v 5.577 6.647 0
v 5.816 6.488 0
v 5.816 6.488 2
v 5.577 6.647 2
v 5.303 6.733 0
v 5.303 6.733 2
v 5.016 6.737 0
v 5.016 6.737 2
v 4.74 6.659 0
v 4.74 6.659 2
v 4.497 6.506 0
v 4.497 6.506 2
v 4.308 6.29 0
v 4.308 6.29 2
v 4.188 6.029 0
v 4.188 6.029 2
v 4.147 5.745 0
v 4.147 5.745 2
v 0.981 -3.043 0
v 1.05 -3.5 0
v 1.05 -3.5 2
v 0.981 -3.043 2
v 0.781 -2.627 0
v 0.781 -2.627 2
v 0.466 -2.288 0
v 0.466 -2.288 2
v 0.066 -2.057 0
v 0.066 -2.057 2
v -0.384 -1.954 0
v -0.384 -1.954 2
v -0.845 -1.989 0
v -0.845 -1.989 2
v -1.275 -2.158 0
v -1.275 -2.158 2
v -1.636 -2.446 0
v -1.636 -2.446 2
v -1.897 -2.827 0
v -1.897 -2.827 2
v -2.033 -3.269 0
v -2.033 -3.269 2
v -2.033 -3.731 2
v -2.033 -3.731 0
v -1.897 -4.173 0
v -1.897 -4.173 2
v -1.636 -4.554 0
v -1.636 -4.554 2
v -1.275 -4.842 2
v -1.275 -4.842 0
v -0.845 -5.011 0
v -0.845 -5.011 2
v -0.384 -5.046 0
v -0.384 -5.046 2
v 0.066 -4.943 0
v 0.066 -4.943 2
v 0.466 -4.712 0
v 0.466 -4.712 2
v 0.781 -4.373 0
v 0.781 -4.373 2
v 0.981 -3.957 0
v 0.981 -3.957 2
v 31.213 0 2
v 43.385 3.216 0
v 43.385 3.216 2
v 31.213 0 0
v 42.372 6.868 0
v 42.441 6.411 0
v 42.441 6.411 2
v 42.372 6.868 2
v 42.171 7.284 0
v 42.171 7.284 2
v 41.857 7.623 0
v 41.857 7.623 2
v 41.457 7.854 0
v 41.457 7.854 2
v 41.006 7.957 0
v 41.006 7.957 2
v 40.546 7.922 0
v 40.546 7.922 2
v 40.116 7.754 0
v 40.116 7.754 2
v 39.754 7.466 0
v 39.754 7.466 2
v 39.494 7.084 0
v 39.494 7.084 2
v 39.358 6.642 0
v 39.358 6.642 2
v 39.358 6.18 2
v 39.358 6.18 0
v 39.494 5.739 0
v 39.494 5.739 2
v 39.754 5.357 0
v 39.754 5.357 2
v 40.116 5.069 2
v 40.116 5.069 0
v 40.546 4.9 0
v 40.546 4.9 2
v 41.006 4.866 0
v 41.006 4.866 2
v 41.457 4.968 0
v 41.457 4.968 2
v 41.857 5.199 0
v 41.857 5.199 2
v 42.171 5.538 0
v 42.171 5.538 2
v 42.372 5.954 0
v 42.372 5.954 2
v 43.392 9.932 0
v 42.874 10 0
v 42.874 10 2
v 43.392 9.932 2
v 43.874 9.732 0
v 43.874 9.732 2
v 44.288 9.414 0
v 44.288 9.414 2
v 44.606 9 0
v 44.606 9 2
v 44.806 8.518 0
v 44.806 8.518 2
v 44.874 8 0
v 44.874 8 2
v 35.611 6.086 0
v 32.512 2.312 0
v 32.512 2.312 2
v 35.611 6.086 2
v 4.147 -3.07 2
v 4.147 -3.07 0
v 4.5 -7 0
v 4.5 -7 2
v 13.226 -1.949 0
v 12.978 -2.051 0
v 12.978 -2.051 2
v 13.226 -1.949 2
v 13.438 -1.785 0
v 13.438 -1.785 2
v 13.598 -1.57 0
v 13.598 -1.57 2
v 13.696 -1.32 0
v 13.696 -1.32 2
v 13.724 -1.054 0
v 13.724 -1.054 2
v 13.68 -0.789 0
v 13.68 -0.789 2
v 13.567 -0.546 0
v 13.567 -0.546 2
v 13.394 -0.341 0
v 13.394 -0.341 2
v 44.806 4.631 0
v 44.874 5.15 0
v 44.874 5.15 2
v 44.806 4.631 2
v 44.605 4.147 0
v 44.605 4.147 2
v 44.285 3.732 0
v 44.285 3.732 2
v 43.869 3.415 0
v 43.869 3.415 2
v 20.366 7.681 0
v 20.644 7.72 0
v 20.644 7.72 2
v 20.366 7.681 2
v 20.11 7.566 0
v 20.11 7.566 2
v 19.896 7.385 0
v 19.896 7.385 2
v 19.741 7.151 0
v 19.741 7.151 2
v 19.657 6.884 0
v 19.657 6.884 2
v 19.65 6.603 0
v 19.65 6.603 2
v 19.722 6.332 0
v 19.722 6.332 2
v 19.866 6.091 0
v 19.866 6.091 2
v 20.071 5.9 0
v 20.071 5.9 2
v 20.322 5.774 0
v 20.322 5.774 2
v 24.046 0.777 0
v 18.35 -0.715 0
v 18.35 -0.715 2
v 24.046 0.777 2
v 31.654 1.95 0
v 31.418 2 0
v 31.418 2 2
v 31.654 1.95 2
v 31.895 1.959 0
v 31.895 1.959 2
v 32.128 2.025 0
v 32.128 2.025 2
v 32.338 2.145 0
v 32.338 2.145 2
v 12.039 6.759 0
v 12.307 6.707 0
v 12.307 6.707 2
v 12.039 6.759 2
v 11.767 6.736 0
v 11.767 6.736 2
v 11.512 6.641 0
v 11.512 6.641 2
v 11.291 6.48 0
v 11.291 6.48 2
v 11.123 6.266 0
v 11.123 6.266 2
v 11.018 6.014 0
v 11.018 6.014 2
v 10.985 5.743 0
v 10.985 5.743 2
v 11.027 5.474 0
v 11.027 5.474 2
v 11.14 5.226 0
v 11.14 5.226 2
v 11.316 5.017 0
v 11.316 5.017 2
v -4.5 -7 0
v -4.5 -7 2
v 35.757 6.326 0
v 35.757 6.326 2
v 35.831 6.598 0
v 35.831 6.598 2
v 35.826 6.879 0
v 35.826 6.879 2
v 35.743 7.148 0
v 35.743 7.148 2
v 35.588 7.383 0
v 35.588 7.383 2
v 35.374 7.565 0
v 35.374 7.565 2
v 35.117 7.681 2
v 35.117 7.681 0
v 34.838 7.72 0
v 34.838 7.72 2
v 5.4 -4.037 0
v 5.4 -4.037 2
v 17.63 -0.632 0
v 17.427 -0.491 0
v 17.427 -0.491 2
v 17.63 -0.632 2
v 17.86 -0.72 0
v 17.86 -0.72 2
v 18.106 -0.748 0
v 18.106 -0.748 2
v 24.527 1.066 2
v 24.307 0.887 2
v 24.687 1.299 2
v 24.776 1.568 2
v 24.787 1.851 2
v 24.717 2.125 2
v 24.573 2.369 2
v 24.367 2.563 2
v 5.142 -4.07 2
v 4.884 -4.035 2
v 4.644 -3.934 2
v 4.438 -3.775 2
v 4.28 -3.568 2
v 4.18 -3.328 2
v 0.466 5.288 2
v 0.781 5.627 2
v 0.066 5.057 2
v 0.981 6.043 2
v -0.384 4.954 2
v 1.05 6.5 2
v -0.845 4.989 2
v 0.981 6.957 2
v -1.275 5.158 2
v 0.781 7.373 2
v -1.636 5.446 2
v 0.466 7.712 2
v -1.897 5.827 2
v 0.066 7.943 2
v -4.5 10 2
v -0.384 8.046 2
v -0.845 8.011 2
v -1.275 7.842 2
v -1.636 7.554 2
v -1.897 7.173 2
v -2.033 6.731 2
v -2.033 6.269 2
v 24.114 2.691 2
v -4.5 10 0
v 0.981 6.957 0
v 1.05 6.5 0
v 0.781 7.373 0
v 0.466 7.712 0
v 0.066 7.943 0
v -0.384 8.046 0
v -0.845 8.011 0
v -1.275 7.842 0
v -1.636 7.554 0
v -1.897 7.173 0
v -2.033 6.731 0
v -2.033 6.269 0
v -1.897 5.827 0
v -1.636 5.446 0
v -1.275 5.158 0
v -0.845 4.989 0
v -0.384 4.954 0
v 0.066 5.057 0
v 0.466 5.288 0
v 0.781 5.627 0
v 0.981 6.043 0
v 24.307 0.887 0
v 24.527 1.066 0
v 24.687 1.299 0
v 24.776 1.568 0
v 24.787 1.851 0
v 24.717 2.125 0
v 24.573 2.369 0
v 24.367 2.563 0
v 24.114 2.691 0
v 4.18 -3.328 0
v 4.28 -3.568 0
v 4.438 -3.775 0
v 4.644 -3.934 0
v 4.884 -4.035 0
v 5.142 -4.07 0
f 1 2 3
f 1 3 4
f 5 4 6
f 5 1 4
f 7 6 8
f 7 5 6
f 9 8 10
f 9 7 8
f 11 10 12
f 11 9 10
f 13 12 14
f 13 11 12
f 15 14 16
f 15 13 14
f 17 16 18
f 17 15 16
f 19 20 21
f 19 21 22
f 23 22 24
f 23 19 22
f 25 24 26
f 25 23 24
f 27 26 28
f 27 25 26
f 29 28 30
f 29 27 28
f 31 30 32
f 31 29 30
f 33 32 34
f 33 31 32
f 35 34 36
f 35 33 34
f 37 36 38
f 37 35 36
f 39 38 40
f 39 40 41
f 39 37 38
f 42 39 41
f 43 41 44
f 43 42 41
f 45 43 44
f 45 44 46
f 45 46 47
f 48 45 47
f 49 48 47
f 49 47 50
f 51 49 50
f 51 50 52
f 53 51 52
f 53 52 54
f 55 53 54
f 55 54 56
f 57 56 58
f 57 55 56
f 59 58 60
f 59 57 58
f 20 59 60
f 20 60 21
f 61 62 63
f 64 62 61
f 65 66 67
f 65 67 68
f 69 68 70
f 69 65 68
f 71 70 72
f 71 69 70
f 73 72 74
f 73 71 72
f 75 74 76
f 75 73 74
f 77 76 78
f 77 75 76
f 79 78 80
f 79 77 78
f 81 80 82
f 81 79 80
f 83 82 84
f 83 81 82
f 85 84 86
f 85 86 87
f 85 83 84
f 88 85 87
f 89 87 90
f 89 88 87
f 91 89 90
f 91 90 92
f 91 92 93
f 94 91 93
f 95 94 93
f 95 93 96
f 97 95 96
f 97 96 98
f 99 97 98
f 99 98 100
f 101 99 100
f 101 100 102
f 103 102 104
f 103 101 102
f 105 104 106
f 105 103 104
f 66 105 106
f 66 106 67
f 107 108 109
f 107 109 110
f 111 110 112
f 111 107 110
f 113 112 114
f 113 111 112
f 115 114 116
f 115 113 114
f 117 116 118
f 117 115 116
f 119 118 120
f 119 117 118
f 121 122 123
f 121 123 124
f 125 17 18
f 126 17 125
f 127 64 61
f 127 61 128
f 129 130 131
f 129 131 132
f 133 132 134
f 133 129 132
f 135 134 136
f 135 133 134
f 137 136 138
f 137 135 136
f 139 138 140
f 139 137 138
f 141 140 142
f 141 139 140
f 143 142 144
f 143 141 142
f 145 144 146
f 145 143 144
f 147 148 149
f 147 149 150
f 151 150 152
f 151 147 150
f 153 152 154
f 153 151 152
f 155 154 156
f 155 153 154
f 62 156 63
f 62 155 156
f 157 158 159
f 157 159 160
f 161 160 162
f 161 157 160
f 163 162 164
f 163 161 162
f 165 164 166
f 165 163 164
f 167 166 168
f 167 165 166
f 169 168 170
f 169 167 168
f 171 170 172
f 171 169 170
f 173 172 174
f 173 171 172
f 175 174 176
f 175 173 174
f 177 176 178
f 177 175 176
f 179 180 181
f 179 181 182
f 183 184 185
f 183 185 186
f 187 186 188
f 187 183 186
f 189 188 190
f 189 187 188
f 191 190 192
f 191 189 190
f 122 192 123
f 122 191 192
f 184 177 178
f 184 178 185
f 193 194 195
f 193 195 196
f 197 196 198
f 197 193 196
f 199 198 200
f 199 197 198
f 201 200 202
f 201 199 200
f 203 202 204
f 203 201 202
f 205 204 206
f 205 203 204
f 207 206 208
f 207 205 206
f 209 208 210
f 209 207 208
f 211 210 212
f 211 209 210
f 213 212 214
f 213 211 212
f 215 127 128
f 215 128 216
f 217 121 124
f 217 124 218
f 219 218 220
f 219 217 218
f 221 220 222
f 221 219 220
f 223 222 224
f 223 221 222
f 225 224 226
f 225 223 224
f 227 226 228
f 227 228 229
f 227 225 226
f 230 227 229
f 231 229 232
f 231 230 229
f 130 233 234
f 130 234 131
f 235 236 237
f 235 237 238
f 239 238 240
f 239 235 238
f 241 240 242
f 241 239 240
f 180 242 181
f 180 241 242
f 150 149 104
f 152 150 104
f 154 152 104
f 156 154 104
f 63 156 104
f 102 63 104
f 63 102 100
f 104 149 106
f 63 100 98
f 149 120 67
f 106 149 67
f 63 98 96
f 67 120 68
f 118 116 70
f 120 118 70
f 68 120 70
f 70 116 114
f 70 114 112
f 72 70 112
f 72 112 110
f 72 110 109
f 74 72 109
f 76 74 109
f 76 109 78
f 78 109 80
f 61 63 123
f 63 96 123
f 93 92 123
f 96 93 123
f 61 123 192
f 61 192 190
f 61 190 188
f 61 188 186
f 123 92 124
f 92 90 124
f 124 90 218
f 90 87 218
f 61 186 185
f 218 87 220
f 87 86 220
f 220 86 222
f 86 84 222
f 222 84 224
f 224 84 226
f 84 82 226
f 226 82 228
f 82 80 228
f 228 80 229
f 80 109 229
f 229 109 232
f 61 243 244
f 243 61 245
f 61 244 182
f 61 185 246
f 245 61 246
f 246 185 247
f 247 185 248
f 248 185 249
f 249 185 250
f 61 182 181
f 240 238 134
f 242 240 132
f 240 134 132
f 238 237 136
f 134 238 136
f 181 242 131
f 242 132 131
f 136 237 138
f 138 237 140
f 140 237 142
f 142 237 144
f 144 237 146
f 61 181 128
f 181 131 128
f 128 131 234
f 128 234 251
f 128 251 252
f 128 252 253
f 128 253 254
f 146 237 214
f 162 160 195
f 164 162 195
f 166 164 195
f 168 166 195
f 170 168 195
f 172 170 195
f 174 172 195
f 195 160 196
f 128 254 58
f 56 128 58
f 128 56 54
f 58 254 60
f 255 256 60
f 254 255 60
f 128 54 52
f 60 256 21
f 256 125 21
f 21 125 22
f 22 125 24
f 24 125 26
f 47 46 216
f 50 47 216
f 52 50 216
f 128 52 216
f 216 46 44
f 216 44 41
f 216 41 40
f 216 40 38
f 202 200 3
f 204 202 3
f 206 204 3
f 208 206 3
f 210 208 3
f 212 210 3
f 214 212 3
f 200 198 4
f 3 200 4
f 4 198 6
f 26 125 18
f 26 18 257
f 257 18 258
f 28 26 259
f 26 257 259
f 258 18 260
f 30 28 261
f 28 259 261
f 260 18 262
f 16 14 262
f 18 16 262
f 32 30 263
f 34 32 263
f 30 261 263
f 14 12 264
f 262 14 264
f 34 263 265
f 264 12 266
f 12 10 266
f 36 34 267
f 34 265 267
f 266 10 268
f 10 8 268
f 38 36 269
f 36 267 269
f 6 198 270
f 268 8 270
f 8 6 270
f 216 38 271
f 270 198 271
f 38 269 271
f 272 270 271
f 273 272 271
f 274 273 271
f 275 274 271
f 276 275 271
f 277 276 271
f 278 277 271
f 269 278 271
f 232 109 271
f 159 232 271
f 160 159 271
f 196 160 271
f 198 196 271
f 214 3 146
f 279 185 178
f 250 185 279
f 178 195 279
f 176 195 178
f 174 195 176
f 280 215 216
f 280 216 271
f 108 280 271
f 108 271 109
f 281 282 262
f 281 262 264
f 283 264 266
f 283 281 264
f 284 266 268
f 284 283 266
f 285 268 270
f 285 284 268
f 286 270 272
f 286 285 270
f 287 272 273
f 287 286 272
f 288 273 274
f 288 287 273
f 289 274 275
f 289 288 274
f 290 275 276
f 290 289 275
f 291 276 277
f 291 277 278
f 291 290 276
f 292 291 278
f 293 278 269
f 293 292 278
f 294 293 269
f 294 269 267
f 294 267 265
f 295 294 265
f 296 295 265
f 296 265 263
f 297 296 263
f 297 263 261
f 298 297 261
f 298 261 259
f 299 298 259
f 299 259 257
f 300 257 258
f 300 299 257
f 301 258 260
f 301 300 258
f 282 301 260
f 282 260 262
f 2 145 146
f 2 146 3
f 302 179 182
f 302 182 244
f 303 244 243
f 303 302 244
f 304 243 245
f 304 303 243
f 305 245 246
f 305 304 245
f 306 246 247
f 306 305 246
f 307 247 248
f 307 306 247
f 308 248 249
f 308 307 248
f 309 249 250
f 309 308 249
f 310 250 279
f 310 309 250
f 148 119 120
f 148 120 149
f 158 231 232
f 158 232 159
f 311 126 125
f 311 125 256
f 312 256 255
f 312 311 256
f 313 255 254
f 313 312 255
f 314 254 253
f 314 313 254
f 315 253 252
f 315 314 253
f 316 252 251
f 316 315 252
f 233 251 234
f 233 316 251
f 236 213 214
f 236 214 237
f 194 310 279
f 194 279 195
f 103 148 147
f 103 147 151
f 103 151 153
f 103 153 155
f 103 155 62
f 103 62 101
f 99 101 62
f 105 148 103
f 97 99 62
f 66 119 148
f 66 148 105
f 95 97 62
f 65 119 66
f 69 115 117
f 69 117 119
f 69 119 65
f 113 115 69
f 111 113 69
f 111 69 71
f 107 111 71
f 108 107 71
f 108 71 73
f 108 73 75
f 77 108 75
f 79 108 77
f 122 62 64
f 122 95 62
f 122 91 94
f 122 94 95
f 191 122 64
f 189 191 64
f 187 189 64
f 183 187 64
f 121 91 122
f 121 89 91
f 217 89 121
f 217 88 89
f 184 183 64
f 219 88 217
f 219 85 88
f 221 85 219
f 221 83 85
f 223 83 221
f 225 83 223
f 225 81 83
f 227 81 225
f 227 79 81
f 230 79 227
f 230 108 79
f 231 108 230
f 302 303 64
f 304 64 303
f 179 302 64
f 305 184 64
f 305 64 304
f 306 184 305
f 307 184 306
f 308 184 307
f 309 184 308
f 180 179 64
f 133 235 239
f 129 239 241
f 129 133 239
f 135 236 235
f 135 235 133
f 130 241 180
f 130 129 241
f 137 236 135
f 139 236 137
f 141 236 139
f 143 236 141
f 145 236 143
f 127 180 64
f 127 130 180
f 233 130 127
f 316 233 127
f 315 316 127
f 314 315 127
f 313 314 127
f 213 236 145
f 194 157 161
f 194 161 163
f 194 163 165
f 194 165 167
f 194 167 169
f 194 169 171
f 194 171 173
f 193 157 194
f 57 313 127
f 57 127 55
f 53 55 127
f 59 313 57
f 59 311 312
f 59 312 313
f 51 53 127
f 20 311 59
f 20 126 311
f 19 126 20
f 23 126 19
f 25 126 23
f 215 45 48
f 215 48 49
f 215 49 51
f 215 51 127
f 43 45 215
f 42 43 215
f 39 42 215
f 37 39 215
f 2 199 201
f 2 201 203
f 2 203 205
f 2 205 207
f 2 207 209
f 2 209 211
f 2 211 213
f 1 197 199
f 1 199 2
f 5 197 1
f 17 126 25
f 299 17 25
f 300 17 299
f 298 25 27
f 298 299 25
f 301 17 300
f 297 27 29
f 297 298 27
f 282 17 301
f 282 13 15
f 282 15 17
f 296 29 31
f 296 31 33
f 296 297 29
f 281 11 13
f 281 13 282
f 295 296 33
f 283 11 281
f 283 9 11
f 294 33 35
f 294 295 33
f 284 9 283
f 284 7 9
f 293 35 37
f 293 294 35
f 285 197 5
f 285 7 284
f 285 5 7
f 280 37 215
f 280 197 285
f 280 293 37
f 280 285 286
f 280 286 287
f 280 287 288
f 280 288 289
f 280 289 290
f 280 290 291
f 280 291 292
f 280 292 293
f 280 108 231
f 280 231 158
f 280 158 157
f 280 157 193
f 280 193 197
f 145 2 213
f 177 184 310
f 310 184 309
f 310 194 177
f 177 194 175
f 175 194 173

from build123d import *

# Parameters (mm, degrees)
SKETCH_1_R      = 1.55
EXTRUDE_1_DEPTH = 2


with BuildPart() as part:
    # 草图1 → 凸台-拉伸1 (new body)
    with BuildSketch(Plane.XY):
        with BuildLine():
            Line((-4.5, 10), (4.5, 10))
            Line((4.5, 10), (42.874156462, 10))
            ThreePointArc((42.874156462, 10), (44.288370024, 9.414213562), (44.874156462, 8))
            Line((44.874156462, 8), (44.874156462, 5.149651674))
            ThreePointArc((44.874156462, 5.149651674), (44.458733517, 3.929358448), (43.385040906, 3.216003028))
            Line((43.385040906, 3.216003028), (31.212777732, 0))
            Line((31.212777732, 0), (4.5, -7))
            Line((4.5, -7), (-4.5, -7))
            Line((-4.5, -7), (-4.5, 10))
        make_face()
        with Locations((-0.5, 6.5)):
            Circle(SKETCH_1_R, mode=Mode.SUBTRACT)
        with Locations((40.890589187, 6.411336053)):
            Circle(SKETCH_1_R, mode=Mode.SUBTRACT)
        with Locations((-0.5, -3.5)):
            Circle(SKETCH_1_R, mode=Mode.SUBTRACT)
        with BuildLine():
            Line((4.146506743, 5.745070559), (4.146506743, -3.06967977))
            ThreePointArc((4.146506743, -3.06967977), (4.535559953, -3.861351432), (5.399994782, -4.037018291))
            Line((5.399994782, -4.037018291), (12.9777079, -2.051302228))
            ThreePointArc((12.9777079, -2.051302228), (13.695890464, -1.320302954), (13.3936769, -0.341112934))
            Line((13.3936769, -0.341112934), (5.815963783, 6.487921333))
            ThreePointArc((5.815963783, 6.487921333), (4.739970791, 6.658705344), (4.146506743, 5.745070559))
        make_face(mode=Mode.SUBTRACT)
        with BuildLine():
            Line((11.315621432, 5.017151032), (17.427365311, -0.490751911))
            ThreePointArc((17.427365311, -0.490751911), (17.860483104, -0.71957174), (18.35031039, -0.715239658))
            Line((18.35031039, -0.715239658), (24.045702218, 0.777219988))
            ThreePointArc((24.045702218, 0.777219988), (24.791574656, 1.708800456), (24.11419002, 2.691306394))
            Line((24.11419002, 2.691306394), (12.307054312, 6.706749691))
            ThreePointArc((12.307054312, 6.706749691), (11.122598499, 6.266093001), (11.315621432, 5.017151032))
        make_face(mode=Mode.SUBTRACT)
        with BuildLine():
            Line((20.321587877, 5.773595304), (31.417514437, 2.000024386))
            ThreePointArc((31.417514437, 2.000024386), (32.013649619, 1.98508799), (32.512293671, 2.312126767))
            Line((32.512293671, 2.312126767), (35.611244636, 6.085697684))
            ThreePointArc((35.611244636, 6.085697684), (35.742500286, 7.147750779), (34.838441243, 7.720343189))
            Line((34.838441243, 7.720343189), (20.643563718, 7.720343189))
            ThreePointArc((20.643563718, 7.720343189), (19.656966565, 6.883518118), (20.321587877, 5.773595304))
        make_face(mode=Mode.SUBTRACT)
    extrude(amount=EXTRUDE_1_DEPTH)


solid = part.part
